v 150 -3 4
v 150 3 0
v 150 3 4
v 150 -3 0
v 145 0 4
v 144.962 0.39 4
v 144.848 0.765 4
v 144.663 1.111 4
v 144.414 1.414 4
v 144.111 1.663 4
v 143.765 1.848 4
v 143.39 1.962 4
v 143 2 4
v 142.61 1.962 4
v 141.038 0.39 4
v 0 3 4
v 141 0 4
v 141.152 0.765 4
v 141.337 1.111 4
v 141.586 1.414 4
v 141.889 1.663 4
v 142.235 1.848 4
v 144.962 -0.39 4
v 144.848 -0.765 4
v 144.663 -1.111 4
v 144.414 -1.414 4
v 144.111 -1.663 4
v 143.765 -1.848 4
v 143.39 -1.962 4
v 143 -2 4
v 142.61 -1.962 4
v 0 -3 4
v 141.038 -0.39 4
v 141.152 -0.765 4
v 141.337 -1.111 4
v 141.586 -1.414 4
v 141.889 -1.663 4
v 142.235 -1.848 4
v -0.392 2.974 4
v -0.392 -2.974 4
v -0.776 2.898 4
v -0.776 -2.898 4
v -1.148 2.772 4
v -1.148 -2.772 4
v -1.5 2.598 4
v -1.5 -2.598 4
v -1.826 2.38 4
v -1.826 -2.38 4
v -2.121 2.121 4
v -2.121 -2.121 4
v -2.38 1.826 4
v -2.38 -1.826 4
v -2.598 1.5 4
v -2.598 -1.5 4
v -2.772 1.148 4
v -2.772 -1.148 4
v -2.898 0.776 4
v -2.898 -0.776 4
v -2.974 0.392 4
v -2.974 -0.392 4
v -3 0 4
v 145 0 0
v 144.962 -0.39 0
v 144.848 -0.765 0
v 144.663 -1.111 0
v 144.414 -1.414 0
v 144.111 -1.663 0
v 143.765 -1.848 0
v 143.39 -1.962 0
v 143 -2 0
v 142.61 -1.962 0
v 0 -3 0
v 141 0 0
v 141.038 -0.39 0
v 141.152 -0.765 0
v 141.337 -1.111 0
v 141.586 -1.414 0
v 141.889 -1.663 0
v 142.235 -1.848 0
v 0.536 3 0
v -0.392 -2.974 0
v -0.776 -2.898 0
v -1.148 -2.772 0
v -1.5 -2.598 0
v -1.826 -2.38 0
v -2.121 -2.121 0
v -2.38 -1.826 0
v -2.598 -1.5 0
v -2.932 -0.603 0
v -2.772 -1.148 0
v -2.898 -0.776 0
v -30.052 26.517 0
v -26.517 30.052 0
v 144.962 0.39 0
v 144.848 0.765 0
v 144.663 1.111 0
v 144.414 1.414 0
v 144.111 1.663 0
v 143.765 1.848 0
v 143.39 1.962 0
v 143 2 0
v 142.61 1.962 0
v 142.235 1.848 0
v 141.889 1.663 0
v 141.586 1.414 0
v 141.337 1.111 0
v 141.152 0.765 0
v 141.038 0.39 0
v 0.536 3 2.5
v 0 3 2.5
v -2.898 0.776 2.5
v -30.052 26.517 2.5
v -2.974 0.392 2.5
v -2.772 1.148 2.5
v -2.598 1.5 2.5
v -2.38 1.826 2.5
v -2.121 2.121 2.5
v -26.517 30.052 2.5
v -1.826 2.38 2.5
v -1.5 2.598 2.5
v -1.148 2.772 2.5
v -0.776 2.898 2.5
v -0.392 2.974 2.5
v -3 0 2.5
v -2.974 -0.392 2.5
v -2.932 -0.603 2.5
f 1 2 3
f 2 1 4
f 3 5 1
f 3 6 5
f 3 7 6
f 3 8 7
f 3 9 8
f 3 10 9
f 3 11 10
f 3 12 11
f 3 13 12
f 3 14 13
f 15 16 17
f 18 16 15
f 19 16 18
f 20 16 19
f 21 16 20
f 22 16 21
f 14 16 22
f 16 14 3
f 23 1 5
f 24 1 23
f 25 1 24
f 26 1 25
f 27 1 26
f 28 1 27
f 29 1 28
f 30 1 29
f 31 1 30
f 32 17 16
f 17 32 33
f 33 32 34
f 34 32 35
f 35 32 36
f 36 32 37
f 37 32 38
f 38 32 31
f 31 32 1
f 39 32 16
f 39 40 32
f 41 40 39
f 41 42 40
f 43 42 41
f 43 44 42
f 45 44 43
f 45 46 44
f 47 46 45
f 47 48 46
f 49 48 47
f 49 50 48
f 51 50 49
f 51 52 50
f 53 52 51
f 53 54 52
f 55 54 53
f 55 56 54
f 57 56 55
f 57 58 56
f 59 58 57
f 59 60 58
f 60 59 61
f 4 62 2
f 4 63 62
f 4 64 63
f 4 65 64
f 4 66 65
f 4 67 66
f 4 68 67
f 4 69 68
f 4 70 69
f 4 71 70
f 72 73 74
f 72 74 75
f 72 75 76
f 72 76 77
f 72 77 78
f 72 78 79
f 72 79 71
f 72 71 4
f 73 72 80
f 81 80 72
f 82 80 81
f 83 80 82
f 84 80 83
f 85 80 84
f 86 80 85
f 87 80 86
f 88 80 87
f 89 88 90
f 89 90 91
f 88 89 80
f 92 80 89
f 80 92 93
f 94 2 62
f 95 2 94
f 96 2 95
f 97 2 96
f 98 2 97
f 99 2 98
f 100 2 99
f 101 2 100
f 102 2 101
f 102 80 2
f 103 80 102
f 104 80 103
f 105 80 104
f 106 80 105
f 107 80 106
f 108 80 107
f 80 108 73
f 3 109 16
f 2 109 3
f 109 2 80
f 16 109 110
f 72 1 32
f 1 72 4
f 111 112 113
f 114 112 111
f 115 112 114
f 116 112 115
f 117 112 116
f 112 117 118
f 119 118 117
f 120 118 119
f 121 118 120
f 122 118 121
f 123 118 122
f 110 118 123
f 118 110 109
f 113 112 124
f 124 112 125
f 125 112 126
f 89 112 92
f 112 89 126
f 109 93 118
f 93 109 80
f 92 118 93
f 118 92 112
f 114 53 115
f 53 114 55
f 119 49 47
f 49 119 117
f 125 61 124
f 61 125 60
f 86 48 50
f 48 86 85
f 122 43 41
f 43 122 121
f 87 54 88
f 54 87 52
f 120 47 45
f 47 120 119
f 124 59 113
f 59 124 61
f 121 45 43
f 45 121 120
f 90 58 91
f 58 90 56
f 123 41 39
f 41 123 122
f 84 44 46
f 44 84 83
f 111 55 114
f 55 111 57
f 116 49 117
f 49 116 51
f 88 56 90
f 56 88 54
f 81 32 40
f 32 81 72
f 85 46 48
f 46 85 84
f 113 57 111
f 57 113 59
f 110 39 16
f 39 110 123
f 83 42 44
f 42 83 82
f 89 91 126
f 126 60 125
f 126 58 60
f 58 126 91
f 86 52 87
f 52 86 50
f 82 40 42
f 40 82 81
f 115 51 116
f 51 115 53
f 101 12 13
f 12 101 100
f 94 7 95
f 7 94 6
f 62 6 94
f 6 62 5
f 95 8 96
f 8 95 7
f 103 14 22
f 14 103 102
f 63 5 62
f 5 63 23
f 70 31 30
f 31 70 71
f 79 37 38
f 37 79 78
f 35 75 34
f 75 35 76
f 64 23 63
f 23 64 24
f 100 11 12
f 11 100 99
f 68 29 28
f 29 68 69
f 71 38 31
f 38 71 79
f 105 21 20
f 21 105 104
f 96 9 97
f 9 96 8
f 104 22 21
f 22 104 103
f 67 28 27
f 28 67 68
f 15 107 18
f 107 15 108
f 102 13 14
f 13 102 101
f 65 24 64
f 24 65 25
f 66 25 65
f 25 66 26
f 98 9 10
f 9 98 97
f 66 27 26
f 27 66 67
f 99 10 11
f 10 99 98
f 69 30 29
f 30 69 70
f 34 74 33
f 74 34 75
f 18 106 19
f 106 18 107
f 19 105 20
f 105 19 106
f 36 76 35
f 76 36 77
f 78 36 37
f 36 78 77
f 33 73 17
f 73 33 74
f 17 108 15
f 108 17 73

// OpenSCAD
// KNOWN-WRONG PART (must fail): the foot is at 135 degrees to the handle instead of 120
// L-shaped ("hockey-stick") cell spreader for plating bacteria
// Category: tools. A flat handle and a thinner spreading foot at 120 degrees, joined by a round
// boss; the foot's bed side is the smooth spreading face. Hanging hole at the handle end.
// Print: PETG or PP, lying flat, 0.15 mm layers, 100 % infill; sterilise with 70 % ethanol
// (or autoclave only if printed in PP).
// SPDX-License-Identifier: CERN-OHL-P-2.0

/* [Spreader] */
handle = [150, 6, 4];     // length (X), width (Y), thickness (Z)
foot = [40, 5, 2.5];      // length along its centre line, width, thickness
foot_angle = 135;         // counter-clockwise from +X, seen from above
boss_d = 6;               // joins the bars at the origin, full handle thickness
hole_d = 4;
hole_x = 143;

/* [Hidden] */
eps = 0.01;

difference() {
    union() {
        translate([0, -handle.y / 2, 0]) cube(handle);
        rotate([0, 0, foot_angle]) translate([0, -foot.y / 2, 0]) cube(foot);
        cylinder(d = boss_d, h = handle.z, $fn = 48);
    }
    translate([hole_x, 0, -1]) cylinder(d = hole_d, h = handle.z + 2, $fn = 32);
}
